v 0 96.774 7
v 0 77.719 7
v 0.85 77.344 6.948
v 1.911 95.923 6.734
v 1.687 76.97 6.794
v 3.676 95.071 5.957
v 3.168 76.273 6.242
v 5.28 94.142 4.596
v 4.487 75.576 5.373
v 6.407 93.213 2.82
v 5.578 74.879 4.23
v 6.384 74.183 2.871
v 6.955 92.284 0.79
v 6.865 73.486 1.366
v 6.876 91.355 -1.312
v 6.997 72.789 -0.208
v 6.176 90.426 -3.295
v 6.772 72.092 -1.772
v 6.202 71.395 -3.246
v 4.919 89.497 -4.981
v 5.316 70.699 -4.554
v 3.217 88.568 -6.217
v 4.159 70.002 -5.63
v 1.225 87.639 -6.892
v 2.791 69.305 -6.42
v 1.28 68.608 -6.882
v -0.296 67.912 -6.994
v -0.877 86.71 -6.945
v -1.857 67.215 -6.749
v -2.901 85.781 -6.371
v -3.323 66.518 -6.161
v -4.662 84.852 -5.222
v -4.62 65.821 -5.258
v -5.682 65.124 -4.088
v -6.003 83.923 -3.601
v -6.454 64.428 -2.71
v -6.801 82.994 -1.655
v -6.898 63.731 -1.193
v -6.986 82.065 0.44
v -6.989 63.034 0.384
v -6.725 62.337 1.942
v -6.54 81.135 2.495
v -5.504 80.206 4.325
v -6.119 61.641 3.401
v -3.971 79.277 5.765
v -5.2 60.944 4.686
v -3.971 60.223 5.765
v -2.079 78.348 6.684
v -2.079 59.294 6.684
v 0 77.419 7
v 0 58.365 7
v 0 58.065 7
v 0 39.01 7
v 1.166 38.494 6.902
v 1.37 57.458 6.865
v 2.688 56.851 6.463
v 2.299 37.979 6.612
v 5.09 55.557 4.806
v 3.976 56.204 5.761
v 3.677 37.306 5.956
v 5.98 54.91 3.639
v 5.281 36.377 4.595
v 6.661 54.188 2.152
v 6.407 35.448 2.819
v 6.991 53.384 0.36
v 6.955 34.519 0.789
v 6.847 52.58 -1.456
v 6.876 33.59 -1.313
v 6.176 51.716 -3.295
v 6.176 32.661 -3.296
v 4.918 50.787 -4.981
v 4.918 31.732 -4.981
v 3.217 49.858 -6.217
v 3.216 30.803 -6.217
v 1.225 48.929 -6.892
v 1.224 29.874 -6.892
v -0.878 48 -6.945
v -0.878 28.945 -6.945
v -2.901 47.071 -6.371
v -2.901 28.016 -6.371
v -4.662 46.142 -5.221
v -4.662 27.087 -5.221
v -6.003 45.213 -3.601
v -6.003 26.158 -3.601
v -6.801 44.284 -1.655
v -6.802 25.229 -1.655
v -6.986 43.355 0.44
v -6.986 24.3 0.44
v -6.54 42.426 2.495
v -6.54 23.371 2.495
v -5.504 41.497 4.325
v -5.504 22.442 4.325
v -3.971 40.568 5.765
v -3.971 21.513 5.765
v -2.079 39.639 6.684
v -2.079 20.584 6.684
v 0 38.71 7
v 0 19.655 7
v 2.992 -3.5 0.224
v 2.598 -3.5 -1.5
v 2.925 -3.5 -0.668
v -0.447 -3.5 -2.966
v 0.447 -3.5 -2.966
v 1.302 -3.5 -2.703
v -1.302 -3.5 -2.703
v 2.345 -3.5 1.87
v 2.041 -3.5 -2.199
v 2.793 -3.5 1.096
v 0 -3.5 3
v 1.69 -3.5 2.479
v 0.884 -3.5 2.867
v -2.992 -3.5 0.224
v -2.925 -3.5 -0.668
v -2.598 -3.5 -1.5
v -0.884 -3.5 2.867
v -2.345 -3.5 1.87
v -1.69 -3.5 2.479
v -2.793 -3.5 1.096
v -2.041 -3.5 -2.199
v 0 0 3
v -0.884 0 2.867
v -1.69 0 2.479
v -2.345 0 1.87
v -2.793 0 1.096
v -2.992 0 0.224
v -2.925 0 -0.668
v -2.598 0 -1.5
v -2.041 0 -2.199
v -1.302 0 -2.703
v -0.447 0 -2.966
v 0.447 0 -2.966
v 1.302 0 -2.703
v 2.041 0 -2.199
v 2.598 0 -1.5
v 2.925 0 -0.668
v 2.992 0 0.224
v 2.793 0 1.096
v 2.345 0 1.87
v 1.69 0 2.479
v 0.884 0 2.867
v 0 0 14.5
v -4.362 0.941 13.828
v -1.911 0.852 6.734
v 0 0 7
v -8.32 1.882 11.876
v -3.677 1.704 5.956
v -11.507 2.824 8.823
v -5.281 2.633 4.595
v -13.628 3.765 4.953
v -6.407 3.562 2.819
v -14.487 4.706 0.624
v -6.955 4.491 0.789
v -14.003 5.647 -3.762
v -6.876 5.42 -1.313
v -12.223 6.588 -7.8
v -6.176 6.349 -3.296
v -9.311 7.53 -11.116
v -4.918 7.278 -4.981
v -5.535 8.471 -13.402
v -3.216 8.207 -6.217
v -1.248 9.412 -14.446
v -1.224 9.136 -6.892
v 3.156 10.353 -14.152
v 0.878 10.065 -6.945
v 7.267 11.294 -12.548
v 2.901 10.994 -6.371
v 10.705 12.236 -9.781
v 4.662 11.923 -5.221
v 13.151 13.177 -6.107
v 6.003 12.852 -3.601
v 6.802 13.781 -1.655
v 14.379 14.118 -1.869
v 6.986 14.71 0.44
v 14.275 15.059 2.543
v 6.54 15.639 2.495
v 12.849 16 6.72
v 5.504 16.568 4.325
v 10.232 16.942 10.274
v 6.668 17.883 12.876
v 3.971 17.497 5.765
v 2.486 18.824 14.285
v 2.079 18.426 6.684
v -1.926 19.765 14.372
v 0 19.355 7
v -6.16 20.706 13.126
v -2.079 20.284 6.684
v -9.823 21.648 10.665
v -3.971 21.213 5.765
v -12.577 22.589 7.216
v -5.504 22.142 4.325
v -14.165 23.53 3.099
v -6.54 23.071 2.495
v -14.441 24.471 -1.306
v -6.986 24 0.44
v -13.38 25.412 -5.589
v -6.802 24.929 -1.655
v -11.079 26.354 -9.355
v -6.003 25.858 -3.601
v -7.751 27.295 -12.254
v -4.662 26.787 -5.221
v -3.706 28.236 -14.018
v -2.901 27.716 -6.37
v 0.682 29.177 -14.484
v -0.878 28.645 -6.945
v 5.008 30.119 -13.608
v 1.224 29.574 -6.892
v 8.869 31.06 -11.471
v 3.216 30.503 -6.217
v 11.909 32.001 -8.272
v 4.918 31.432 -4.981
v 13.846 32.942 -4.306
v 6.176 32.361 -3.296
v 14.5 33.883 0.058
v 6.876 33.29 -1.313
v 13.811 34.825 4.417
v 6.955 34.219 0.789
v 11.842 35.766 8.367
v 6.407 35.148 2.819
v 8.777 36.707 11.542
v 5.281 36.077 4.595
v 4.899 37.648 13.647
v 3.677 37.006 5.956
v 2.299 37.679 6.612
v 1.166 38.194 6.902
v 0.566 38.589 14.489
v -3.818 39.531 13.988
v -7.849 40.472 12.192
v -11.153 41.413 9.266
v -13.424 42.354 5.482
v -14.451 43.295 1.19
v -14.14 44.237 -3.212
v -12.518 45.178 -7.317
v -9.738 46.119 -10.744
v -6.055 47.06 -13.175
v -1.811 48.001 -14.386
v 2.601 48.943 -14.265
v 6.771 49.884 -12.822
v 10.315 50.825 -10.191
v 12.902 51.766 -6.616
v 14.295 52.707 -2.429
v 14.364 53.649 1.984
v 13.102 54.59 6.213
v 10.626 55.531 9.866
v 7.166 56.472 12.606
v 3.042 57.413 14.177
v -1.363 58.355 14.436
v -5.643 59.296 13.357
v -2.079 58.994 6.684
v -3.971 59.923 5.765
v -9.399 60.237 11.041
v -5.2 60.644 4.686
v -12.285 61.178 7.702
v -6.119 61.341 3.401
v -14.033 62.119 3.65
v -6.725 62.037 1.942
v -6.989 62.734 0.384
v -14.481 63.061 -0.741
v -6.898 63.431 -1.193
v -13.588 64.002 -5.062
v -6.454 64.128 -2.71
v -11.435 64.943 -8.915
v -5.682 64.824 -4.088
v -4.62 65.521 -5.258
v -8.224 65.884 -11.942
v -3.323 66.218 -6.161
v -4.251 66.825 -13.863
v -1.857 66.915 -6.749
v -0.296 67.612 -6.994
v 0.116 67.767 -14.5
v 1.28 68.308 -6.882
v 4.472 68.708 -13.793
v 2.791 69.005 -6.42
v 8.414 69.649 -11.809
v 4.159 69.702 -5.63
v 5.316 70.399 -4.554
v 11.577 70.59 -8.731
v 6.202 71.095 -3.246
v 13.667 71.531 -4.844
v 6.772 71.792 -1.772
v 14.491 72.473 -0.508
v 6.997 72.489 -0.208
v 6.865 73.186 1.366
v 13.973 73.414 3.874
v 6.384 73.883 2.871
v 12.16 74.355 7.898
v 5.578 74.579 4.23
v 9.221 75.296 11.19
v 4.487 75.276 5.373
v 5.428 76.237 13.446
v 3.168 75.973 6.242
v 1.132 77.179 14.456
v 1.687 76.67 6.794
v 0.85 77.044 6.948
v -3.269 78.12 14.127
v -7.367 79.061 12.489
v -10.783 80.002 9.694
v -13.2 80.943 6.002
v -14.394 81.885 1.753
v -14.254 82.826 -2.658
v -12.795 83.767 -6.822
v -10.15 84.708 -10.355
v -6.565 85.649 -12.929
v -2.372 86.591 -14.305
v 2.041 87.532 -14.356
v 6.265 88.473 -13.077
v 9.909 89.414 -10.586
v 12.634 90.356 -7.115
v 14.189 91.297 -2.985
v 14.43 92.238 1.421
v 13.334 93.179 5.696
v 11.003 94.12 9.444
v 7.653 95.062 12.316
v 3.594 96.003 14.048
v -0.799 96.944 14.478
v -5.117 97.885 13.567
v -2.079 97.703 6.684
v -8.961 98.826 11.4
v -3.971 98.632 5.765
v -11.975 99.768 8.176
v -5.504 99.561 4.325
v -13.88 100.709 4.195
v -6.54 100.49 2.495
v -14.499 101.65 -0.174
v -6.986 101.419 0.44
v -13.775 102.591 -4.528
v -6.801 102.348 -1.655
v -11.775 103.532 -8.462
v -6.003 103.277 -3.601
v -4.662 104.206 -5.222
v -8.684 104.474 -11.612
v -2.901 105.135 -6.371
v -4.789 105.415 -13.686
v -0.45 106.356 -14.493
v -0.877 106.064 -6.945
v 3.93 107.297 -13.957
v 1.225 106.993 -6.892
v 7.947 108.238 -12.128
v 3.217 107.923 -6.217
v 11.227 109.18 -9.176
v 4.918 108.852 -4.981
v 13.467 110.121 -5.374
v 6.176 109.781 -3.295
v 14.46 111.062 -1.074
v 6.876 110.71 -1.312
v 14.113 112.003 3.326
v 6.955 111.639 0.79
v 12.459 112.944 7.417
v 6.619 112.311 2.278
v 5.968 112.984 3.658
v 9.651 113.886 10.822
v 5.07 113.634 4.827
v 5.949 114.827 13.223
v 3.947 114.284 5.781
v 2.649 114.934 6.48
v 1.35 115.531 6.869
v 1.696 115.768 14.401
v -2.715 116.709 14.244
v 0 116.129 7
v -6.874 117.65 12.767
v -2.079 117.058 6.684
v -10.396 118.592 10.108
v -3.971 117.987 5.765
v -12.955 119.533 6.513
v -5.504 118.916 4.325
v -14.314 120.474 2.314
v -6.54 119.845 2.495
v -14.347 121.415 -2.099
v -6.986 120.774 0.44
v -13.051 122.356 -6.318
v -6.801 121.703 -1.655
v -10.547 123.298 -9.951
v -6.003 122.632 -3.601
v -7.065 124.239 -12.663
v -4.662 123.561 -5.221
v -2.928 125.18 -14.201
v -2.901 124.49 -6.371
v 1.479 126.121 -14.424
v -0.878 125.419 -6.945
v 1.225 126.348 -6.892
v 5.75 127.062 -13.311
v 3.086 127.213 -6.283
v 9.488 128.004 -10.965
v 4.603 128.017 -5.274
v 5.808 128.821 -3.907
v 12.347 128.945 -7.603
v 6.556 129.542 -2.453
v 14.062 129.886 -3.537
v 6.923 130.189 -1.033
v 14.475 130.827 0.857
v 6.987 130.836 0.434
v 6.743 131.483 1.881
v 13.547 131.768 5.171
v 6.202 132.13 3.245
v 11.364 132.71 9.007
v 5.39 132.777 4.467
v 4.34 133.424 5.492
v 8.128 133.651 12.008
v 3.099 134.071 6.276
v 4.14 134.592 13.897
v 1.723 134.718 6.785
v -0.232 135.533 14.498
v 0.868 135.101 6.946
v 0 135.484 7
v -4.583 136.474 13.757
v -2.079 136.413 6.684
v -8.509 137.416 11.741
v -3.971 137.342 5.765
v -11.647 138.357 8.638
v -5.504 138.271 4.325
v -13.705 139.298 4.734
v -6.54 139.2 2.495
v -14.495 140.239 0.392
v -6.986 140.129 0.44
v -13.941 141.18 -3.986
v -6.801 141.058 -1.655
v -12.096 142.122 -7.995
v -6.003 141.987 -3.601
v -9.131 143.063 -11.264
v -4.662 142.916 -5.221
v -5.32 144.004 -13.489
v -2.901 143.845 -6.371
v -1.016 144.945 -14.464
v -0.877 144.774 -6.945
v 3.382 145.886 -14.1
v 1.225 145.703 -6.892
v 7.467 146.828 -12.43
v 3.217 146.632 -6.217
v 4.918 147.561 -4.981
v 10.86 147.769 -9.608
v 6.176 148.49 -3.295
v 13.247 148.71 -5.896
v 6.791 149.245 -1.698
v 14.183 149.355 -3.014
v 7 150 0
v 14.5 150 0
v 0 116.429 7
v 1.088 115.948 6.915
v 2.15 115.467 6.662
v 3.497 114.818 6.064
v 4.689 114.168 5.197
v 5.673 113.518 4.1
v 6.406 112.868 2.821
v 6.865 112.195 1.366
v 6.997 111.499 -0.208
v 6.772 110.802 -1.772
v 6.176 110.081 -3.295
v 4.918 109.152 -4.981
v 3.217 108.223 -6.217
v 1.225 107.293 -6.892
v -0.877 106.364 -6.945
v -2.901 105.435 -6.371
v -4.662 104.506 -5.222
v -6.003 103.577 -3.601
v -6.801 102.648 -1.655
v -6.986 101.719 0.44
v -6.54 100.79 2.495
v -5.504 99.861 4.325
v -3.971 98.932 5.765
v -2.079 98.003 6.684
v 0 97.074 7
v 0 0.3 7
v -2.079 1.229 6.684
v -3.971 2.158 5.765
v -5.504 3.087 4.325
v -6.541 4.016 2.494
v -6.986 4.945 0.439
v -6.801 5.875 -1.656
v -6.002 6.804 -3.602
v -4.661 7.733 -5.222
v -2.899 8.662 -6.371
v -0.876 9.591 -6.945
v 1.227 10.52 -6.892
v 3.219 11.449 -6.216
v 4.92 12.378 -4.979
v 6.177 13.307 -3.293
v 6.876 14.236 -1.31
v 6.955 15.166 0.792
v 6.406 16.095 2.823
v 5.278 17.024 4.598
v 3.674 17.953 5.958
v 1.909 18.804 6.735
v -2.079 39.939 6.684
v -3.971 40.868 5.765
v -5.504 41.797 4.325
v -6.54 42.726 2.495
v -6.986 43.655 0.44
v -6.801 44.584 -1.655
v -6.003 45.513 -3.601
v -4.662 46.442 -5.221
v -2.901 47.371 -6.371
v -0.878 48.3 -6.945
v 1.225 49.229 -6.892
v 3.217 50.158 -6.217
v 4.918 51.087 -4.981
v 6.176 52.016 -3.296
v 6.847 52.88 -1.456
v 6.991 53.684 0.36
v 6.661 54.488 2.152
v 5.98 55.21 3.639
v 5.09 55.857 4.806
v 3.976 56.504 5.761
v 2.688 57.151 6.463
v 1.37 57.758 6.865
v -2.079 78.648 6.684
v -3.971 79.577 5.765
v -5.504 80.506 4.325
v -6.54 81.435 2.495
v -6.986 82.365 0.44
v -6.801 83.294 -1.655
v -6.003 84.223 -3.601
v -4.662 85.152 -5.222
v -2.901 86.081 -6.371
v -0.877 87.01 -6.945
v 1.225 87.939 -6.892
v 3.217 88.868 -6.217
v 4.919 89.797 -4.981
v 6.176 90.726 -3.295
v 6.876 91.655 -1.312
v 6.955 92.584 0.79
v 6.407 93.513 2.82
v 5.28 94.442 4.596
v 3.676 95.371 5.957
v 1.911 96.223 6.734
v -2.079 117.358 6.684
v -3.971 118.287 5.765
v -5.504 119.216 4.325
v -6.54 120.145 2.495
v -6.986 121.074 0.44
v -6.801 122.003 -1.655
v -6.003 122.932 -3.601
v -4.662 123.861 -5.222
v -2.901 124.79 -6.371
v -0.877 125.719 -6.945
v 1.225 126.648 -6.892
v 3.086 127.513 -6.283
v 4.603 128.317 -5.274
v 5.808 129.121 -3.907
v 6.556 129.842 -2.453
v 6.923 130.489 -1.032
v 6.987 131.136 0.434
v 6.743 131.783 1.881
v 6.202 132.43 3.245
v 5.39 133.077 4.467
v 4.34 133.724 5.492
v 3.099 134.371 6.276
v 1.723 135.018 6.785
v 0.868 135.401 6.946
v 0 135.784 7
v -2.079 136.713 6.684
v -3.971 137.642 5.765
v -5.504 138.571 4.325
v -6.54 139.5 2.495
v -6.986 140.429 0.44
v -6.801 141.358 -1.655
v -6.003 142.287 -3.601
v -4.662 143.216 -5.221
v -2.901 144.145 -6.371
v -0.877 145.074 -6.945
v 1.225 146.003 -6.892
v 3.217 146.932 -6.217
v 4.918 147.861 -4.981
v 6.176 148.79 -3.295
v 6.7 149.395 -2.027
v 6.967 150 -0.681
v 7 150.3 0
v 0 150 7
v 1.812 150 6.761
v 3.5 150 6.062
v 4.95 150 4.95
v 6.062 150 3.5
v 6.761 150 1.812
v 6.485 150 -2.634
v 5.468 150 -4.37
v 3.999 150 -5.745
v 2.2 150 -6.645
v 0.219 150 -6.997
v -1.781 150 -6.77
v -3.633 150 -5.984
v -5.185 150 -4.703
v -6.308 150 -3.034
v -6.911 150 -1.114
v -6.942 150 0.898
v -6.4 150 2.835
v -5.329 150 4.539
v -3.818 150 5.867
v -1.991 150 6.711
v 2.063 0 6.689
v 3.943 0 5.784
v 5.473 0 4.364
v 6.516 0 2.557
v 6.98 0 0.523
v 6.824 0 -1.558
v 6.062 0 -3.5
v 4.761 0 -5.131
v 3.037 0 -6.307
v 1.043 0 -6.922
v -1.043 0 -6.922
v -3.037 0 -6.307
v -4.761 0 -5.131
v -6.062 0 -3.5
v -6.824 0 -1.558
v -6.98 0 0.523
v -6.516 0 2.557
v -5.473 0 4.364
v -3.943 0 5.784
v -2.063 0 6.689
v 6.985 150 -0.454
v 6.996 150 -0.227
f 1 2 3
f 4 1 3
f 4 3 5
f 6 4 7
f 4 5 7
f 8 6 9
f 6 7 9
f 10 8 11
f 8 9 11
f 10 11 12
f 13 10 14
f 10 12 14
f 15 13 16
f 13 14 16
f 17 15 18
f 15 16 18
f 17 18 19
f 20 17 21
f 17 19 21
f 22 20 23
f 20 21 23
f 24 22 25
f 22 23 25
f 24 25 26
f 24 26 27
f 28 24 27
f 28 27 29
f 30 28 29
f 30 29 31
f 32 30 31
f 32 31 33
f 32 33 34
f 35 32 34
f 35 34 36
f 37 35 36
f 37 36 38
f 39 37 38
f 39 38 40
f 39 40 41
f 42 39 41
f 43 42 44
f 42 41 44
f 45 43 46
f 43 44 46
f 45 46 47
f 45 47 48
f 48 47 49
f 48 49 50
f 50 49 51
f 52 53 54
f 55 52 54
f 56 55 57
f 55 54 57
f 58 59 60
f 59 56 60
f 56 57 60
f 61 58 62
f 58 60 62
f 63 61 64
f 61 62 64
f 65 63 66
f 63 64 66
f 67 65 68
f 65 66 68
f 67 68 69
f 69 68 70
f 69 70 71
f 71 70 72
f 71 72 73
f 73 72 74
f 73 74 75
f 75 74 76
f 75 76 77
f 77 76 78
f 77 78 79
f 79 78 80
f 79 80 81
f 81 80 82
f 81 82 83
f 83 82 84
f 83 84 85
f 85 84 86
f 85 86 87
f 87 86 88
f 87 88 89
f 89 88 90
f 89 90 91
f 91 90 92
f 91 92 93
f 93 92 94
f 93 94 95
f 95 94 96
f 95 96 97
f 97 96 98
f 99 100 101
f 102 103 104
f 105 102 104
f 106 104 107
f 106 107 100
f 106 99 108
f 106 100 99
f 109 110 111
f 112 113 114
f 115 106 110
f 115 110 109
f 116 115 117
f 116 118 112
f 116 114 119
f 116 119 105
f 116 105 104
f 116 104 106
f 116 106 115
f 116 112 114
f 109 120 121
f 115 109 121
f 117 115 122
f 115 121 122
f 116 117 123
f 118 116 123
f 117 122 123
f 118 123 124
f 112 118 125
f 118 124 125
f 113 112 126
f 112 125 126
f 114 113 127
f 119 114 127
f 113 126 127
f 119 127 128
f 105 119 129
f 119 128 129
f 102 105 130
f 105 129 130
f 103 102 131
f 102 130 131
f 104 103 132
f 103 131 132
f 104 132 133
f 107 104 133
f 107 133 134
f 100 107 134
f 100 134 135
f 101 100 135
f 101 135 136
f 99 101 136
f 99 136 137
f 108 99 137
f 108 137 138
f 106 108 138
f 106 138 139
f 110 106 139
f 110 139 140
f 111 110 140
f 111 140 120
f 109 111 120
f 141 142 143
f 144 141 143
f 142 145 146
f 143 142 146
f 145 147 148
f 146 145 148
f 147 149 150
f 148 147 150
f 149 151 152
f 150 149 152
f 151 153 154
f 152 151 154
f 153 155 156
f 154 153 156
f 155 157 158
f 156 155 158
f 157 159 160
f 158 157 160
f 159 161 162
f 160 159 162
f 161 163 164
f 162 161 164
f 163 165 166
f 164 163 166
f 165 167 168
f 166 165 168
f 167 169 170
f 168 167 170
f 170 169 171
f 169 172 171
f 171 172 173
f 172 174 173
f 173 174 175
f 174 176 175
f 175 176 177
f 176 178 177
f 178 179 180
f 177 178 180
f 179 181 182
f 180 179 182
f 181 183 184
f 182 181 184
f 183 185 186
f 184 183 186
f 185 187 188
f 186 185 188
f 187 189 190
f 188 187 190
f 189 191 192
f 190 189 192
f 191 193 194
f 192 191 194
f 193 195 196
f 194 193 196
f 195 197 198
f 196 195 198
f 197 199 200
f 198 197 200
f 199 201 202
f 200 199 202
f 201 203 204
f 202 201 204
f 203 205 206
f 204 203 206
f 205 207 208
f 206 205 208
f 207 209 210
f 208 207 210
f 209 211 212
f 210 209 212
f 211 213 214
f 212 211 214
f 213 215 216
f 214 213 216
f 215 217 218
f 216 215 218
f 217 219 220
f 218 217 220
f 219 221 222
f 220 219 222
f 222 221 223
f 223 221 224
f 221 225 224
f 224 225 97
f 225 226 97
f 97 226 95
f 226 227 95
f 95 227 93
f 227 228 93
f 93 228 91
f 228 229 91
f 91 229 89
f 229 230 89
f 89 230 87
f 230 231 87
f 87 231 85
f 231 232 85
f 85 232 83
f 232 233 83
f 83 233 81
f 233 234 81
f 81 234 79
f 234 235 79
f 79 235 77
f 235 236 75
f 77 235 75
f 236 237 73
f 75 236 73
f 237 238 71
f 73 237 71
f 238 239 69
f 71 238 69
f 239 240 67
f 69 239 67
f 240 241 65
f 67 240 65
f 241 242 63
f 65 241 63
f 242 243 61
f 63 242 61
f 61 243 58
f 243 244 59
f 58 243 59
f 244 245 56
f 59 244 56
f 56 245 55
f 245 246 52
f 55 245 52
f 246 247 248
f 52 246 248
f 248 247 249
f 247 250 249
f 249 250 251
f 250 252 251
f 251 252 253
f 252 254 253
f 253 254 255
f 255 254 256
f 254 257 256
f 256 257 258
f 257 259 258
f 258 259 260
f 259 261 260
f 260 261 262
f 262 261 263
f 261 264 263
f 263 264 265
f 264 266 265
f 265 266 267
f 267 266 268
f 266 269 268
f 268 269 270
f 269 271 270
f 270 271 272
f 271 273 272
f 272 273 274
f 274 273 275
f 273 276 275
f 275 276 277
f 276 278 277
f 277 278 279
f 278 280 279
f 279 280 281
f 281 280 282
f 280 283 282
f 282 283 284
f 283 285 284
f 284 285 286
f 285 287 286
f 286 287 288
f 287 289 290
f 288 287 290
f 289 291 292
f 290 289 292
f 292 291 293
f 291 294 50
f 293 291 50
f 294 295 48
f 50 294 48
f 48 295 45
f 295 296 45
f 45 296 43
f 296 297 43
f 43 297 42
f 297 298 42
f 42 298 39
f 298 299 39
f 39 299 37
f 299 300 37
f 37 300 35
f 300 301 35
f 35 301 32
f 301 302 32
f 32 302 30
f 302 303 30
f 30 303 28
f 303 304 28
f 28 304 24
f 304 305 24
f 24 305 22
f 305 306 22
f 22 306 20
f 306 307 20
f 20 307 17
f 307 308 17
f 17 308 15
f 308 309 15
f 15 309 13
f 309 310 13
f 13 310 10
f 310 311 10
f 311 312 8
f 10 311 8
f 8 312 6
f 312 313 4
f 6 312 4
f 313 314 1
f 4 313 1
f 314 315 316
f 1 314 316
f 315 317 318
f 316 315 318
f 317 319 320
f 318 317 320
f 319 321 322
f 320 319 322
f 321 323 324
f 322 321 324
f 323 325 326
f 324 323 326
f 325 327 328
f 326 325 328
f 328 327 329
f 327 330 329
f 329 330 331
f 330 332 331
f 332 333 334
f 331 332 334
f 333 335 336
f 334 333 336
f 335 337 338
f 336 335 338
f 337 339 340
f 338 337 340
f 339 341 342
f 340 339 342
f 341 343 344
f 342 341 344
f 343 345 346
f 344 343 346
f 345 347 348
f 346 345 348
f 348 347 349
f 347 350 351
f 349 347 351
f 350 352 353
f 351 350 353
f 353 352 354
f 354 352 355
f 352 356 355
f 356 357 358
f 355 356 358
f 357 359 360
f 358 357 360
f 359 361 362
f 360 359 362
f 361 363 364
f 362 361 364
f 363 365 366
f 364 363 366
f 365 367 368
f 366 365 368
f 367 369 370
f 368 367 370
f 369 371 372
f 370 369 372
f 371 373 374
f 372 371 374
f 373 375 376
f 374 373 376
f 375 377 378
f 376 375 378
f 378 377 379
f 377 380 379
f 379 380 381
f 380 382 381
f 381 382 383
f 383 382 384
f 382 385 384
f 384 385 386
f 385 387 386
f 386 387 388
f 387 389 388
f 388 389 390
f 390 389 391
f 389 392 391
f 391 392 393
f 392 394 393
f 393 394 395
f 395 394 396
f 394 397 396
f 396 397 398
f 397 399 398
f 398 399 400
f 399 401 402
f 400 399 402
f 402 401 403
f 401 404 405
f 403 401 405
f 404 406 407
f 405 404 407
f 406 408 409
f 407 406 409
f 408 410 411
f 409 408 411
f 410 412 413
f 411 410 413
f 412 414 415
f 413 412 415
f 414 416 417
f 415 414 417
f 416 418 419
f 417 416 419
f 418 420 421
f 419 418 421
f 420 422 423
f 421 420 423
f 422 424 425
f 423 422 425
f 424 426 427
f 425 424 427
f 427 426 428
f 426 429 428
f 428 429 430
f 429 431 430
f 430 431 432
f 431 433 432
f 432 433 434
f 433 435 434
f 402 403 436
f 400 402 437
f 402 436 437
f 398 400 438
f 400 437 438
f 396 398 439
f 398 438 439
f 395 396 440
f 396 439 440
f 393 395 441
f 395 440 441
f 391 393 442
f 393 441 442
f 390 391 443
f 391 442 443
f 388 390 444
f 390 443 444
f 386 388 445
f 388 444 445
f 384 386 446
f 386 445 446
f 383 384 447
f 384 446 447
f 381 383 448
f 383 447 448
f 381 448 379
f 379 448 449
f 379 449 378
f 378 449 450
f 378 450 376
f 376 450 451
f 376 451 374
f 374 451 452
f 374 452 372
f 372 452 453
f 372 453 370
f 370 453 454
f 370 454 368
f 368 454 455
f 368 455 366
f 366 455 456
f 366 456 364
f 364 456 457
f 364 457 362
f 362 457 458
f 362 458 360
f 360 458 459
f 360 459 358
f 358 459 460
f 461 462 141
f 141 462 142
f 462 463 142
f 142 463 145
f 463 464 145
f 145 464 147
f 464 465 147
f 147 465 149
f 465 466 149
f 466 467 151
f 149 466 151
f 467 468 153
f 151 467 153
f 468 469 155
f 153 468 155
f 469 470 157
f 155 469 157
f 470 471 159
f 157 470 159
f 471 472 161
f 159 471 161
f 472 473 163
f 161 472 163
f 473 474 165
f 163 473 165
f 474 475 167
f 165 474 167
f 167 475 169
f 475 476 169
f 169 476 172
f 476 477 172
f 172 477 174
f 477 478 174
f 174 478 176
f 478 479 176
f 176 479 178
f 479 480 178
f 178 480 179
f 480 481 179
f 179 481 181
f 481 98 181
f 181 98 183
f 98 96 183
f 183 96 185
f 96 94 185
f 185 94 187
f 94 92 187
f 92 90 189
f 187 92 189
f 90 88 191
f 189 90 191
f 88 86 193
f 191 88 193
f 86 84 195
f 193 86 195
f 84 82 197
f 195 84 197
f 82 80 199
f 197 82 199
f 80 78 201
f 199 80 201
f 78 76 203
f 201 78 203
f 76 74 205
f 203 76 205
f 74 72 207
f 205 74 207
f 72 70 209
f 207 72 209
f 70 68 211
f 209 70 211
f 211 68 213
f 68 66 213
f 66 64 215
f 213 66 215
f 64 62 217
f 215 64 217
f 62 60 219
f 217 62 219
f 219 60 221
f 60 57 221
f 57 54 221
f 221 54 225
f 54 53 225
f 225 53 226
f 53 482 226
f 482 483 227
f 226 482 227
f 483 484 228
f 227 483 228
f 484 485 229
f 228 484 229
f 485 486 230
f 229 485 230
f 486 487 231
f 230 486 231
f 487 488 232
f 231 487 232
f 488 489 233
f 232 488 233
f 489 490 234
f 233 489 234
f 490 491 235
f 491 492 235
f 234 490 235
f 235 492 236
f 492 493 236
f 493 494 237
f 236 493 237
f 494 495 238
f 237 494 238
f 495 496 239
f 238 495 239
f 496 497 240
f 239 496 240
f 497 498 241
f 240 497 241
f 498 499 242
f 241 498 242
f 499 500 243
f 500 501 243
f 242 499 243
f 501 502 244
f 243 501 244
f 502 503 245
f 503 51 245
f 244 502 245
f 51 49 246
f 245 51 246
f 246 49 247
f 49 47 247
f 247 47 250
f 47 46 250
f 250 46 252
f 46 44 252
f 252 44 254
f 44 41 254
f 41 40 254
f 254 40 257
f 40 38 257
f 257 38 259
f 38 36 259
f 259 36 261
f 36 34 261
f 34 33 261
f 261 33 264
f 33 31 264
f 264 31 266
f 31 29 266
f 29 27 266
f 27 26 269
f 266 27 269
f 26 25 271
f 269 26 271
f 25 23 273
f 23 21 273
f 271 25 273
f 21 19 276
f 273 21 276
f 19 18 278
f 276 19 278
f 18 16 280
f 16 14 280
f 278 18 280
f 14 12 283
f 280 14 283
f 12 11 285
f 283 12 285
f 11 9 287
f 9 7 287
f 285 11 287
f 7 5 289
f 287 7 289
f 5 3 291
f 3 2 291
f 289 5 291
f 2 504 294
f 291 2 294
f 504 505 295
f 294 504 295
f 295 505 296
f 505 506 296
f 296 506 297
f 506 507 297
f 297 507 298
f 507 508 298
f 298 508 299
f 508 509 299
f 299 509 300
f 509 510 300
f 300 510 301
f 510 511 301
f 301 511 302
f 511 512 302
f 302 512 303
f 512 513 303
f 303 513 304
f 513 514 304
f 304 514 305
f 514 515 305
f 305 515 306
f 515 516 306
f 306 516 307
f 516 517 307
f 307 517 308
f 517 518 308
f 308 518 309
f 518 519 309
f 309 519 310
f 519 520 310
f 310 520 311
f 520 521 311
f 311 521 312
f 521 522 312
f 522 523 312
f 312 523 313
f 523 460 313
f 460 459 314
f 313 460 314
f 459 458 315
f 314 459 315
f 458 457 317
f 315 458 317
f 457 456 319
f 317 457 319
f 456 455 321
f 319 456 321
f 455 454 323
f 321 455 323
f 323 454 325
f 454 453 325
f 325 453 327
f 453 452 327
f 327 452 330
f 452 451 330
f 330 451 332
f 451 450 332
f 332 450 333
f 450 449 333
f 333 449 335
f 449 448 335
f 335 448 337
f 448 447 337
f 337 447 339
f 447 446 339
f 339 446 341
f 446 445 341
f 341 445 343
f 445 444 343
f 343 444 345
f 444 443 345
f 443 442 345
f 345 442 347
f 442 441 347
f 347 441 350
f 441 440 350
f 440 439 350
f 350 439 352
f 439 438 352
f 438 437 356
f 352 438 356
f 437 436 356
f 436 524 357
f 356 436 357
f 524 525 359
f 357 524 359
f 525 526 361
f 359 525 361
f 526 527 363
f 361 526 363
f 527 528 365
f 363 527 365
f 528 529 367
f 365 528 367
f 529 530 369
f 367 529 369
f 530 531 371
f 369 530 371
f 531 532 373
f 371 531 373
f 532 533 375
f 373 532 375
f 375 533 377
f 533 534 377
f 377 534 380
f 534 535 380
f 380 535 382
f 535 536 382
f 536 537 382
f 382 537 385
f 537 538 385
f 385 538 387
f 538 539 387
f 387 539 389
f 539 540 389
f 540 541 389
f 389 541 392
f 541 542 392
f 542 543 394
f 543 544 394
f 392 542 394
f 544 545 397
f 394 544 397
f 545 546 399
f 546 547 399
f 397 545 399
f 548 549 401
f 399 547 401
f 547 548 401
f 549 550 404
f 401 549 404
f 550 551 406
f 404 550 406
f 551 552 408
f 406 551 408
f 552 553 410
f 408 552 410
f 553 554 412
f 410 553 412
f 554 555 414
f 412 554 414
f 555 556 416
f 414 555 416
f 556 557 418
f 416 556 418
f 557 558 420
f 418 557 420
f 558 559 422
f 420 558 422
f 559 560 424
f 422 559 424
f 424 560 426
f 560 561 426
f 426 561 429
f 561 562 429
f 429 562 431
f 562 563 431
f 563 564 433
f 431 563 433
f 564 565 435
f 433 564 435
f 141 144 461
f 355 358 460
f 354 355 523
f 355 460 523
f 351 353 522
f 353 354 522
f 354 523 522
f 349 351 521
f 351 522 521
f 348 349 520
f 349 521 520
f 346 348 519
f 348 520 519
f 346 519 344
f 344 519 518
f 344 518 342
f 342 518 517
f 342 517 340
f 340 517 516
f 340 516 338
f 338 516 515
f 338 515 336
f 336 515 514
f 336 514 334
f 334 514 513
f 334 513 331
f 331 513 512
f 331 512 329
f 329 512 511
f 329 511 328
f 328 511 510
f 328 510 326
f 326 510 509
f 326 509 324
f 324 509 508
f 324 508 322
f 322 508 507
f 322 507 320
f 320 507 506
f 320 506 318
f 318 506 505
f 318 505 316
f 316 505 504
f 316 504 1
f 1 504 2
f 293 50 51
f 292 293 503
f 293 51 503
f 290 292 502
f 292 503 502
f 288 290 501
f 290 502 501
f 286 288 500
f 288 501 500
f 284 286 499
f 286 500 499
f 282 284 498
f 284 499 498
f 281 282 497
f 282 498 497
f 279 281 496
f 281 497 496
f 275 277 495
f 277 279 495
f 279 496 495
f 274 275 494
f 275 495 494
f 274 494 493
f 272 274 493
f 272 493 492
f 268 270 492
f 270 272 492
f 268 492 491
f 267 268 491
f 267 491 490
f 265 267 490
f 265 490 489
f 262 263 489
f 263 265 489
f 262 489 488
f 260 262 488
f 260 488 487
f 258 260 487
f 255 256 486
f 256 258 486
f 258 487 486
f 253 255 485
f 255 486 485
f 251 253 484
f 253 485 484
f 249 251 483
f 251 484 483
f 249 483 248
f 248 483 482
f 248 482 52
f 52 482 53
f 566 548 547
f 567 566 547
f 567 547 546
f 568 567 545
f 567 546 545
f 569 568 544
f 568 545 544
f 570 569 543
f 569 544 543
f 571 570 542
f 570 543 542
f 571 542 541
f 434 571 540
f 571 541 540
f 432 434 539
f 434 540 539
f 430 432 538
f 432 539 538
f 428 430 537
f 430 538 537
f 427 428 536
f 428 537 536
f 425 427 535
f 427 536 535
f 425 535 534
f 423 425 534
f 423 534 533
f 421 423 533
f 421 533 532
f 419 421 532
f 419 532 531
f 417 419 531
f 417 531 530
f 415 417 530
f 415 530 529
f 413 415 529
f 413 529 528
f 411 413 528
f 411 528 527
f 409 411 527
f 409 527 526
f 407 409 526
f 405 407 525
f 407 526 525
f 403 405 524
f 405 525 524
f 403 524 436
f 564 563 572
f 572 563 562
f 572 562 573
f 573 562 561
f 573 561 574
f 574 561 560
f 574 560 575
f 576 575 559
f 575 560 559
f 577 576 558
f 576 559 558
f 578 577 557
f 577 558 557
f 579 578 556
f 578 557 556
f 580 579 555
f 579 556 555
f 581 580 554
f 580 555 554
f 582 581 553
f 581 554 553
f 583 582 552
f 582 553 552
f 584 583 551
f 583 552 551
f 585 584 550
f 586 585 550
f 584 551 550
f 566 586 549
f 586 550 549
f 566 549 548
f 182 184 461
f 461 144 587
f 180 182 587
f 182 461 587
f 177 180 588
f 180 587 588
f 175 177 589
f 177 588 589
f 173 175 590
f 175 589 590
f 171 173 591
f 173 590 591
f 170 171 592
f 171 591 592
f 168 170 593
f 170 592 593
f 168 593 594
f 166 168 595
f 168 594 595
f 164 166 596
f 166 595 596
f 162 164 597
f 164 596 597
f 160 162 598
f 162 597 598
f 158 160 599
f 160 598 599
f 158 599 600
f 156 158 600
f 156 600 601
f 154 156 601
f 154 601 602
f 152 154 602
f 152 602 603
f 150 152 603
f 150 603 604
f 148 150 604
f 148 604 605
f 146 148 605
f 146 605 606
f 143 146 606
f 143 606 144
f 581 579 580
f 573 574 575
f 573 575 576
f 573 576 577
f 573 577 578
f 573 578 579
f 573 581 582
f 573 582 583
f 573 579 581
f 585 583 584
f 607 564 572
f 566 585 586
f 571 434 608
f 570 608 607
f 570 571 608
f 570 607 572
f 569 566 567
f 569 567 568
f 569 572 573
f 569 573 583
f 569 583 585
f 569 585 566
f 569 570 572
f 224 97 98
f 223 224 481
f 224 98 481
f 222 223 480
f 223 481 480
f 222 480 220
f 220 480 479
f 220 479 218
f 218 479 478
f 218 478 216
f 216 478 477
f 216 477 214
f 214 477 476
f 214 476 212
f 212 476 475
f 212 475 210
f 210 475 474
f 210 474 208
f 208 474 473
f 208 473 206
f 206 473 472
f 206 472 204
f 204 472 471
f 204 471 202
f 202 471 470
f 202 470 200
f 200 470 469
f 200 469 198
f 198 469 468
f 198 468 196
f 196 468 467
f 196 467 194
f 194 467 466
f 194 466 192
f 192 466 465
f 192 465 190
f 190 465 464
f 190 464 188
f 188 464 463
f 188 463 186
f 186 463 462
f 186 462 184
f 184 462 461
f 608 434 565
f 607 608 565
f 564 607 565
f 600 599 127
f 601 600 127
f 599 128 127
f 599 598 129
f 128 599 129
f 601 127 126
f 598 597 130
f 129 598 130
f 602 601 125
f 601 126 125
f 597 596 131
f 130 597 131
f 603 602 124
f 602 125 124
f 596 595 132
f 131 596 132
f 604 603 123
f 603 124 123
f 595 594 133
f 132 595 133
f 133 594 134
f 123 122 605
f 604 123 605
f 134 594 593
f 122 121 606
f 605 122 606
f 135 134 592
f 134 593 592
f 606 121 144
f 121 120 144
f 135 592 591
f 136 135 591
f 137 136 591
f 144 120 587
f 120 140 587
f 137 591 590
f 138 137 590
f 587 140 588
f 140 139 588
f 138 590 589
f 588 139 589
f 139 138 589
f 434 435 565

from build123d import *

# Parameters (mm, degrees)
SKETCH_1_R          = 7
EXTRUDE_1_DEPTH     = 150
SWEEP_2_PITCH       = 19.35483871
SWEEP_2_HEIGHT      = 150
SWEEP_2_RADIUS      = 7
SKETCH_8_R          = 3
EXTRUDE_2_DEPTH     = 5
CUT_EXTRUDE_START   = -1.5
SKETCH_9_R          = 3
CUT_EXTRUDE_1_DEPTH = 1.5


with BuildPart() as part:
    # 草圖1 → 填料-伸長1 (new body)
    with BuildSketch(Plane(origin=(0, 0, 0), x_dir=(1, 0, 0), z_dir=(0, 1, 0))):
        with Locations(Location((0, 0, 0), (0, 0, 270))):
            Circle(SKETCH_1_R)
    extrude(amount=EXTRUDE_1_DEPTH)

    # 掃出2: sweep along a helix
    with BuildLine() as sweep_2_path:
        Helix(SWEEP_2_PITCH, SWEEP_2_HEIGHT, SWEEP_2_RADIUS, center=(0, 0, 0), direction=(0, 1, 0), lefthand=True)
    # 草圖4 → 掃出2 (sweep)
    with BuildSketch(Plane(origin=(0, 0, 0), x_dir=(0, 0, -1), z_dir=(1, 0, 0))):
        Polygon((-7, 0.3), (-14.5, 0), (-7, 0), align=None)
    sweep(path=sweep_2_path.line, is_frenet=True)

    # 草圖8 → 填料-伸長2 (add)
    with BuildSketch(Plane.XZ):
        with Locations(Location((0, 0, 0), (0, 0, 90))):
            Circle(SKETCH_8_R)
    extrude(amount=EXTRUDE_2_DEPTH)

    # 草圖9 → 除料-伸長1 (cut)
    with BuildSketch(Plane.XZ.offset(5).offset(CUT_EXTRUDE_START)):
        with Locations(Location((0, 0, 0), (0, 0, 90))):
            Circle(SKETCH_9_R)
    extrude(amount=CUT_EXTRUDE_1_DEPTH, mode=Mode.SUBTRACT)


solid = part.part
